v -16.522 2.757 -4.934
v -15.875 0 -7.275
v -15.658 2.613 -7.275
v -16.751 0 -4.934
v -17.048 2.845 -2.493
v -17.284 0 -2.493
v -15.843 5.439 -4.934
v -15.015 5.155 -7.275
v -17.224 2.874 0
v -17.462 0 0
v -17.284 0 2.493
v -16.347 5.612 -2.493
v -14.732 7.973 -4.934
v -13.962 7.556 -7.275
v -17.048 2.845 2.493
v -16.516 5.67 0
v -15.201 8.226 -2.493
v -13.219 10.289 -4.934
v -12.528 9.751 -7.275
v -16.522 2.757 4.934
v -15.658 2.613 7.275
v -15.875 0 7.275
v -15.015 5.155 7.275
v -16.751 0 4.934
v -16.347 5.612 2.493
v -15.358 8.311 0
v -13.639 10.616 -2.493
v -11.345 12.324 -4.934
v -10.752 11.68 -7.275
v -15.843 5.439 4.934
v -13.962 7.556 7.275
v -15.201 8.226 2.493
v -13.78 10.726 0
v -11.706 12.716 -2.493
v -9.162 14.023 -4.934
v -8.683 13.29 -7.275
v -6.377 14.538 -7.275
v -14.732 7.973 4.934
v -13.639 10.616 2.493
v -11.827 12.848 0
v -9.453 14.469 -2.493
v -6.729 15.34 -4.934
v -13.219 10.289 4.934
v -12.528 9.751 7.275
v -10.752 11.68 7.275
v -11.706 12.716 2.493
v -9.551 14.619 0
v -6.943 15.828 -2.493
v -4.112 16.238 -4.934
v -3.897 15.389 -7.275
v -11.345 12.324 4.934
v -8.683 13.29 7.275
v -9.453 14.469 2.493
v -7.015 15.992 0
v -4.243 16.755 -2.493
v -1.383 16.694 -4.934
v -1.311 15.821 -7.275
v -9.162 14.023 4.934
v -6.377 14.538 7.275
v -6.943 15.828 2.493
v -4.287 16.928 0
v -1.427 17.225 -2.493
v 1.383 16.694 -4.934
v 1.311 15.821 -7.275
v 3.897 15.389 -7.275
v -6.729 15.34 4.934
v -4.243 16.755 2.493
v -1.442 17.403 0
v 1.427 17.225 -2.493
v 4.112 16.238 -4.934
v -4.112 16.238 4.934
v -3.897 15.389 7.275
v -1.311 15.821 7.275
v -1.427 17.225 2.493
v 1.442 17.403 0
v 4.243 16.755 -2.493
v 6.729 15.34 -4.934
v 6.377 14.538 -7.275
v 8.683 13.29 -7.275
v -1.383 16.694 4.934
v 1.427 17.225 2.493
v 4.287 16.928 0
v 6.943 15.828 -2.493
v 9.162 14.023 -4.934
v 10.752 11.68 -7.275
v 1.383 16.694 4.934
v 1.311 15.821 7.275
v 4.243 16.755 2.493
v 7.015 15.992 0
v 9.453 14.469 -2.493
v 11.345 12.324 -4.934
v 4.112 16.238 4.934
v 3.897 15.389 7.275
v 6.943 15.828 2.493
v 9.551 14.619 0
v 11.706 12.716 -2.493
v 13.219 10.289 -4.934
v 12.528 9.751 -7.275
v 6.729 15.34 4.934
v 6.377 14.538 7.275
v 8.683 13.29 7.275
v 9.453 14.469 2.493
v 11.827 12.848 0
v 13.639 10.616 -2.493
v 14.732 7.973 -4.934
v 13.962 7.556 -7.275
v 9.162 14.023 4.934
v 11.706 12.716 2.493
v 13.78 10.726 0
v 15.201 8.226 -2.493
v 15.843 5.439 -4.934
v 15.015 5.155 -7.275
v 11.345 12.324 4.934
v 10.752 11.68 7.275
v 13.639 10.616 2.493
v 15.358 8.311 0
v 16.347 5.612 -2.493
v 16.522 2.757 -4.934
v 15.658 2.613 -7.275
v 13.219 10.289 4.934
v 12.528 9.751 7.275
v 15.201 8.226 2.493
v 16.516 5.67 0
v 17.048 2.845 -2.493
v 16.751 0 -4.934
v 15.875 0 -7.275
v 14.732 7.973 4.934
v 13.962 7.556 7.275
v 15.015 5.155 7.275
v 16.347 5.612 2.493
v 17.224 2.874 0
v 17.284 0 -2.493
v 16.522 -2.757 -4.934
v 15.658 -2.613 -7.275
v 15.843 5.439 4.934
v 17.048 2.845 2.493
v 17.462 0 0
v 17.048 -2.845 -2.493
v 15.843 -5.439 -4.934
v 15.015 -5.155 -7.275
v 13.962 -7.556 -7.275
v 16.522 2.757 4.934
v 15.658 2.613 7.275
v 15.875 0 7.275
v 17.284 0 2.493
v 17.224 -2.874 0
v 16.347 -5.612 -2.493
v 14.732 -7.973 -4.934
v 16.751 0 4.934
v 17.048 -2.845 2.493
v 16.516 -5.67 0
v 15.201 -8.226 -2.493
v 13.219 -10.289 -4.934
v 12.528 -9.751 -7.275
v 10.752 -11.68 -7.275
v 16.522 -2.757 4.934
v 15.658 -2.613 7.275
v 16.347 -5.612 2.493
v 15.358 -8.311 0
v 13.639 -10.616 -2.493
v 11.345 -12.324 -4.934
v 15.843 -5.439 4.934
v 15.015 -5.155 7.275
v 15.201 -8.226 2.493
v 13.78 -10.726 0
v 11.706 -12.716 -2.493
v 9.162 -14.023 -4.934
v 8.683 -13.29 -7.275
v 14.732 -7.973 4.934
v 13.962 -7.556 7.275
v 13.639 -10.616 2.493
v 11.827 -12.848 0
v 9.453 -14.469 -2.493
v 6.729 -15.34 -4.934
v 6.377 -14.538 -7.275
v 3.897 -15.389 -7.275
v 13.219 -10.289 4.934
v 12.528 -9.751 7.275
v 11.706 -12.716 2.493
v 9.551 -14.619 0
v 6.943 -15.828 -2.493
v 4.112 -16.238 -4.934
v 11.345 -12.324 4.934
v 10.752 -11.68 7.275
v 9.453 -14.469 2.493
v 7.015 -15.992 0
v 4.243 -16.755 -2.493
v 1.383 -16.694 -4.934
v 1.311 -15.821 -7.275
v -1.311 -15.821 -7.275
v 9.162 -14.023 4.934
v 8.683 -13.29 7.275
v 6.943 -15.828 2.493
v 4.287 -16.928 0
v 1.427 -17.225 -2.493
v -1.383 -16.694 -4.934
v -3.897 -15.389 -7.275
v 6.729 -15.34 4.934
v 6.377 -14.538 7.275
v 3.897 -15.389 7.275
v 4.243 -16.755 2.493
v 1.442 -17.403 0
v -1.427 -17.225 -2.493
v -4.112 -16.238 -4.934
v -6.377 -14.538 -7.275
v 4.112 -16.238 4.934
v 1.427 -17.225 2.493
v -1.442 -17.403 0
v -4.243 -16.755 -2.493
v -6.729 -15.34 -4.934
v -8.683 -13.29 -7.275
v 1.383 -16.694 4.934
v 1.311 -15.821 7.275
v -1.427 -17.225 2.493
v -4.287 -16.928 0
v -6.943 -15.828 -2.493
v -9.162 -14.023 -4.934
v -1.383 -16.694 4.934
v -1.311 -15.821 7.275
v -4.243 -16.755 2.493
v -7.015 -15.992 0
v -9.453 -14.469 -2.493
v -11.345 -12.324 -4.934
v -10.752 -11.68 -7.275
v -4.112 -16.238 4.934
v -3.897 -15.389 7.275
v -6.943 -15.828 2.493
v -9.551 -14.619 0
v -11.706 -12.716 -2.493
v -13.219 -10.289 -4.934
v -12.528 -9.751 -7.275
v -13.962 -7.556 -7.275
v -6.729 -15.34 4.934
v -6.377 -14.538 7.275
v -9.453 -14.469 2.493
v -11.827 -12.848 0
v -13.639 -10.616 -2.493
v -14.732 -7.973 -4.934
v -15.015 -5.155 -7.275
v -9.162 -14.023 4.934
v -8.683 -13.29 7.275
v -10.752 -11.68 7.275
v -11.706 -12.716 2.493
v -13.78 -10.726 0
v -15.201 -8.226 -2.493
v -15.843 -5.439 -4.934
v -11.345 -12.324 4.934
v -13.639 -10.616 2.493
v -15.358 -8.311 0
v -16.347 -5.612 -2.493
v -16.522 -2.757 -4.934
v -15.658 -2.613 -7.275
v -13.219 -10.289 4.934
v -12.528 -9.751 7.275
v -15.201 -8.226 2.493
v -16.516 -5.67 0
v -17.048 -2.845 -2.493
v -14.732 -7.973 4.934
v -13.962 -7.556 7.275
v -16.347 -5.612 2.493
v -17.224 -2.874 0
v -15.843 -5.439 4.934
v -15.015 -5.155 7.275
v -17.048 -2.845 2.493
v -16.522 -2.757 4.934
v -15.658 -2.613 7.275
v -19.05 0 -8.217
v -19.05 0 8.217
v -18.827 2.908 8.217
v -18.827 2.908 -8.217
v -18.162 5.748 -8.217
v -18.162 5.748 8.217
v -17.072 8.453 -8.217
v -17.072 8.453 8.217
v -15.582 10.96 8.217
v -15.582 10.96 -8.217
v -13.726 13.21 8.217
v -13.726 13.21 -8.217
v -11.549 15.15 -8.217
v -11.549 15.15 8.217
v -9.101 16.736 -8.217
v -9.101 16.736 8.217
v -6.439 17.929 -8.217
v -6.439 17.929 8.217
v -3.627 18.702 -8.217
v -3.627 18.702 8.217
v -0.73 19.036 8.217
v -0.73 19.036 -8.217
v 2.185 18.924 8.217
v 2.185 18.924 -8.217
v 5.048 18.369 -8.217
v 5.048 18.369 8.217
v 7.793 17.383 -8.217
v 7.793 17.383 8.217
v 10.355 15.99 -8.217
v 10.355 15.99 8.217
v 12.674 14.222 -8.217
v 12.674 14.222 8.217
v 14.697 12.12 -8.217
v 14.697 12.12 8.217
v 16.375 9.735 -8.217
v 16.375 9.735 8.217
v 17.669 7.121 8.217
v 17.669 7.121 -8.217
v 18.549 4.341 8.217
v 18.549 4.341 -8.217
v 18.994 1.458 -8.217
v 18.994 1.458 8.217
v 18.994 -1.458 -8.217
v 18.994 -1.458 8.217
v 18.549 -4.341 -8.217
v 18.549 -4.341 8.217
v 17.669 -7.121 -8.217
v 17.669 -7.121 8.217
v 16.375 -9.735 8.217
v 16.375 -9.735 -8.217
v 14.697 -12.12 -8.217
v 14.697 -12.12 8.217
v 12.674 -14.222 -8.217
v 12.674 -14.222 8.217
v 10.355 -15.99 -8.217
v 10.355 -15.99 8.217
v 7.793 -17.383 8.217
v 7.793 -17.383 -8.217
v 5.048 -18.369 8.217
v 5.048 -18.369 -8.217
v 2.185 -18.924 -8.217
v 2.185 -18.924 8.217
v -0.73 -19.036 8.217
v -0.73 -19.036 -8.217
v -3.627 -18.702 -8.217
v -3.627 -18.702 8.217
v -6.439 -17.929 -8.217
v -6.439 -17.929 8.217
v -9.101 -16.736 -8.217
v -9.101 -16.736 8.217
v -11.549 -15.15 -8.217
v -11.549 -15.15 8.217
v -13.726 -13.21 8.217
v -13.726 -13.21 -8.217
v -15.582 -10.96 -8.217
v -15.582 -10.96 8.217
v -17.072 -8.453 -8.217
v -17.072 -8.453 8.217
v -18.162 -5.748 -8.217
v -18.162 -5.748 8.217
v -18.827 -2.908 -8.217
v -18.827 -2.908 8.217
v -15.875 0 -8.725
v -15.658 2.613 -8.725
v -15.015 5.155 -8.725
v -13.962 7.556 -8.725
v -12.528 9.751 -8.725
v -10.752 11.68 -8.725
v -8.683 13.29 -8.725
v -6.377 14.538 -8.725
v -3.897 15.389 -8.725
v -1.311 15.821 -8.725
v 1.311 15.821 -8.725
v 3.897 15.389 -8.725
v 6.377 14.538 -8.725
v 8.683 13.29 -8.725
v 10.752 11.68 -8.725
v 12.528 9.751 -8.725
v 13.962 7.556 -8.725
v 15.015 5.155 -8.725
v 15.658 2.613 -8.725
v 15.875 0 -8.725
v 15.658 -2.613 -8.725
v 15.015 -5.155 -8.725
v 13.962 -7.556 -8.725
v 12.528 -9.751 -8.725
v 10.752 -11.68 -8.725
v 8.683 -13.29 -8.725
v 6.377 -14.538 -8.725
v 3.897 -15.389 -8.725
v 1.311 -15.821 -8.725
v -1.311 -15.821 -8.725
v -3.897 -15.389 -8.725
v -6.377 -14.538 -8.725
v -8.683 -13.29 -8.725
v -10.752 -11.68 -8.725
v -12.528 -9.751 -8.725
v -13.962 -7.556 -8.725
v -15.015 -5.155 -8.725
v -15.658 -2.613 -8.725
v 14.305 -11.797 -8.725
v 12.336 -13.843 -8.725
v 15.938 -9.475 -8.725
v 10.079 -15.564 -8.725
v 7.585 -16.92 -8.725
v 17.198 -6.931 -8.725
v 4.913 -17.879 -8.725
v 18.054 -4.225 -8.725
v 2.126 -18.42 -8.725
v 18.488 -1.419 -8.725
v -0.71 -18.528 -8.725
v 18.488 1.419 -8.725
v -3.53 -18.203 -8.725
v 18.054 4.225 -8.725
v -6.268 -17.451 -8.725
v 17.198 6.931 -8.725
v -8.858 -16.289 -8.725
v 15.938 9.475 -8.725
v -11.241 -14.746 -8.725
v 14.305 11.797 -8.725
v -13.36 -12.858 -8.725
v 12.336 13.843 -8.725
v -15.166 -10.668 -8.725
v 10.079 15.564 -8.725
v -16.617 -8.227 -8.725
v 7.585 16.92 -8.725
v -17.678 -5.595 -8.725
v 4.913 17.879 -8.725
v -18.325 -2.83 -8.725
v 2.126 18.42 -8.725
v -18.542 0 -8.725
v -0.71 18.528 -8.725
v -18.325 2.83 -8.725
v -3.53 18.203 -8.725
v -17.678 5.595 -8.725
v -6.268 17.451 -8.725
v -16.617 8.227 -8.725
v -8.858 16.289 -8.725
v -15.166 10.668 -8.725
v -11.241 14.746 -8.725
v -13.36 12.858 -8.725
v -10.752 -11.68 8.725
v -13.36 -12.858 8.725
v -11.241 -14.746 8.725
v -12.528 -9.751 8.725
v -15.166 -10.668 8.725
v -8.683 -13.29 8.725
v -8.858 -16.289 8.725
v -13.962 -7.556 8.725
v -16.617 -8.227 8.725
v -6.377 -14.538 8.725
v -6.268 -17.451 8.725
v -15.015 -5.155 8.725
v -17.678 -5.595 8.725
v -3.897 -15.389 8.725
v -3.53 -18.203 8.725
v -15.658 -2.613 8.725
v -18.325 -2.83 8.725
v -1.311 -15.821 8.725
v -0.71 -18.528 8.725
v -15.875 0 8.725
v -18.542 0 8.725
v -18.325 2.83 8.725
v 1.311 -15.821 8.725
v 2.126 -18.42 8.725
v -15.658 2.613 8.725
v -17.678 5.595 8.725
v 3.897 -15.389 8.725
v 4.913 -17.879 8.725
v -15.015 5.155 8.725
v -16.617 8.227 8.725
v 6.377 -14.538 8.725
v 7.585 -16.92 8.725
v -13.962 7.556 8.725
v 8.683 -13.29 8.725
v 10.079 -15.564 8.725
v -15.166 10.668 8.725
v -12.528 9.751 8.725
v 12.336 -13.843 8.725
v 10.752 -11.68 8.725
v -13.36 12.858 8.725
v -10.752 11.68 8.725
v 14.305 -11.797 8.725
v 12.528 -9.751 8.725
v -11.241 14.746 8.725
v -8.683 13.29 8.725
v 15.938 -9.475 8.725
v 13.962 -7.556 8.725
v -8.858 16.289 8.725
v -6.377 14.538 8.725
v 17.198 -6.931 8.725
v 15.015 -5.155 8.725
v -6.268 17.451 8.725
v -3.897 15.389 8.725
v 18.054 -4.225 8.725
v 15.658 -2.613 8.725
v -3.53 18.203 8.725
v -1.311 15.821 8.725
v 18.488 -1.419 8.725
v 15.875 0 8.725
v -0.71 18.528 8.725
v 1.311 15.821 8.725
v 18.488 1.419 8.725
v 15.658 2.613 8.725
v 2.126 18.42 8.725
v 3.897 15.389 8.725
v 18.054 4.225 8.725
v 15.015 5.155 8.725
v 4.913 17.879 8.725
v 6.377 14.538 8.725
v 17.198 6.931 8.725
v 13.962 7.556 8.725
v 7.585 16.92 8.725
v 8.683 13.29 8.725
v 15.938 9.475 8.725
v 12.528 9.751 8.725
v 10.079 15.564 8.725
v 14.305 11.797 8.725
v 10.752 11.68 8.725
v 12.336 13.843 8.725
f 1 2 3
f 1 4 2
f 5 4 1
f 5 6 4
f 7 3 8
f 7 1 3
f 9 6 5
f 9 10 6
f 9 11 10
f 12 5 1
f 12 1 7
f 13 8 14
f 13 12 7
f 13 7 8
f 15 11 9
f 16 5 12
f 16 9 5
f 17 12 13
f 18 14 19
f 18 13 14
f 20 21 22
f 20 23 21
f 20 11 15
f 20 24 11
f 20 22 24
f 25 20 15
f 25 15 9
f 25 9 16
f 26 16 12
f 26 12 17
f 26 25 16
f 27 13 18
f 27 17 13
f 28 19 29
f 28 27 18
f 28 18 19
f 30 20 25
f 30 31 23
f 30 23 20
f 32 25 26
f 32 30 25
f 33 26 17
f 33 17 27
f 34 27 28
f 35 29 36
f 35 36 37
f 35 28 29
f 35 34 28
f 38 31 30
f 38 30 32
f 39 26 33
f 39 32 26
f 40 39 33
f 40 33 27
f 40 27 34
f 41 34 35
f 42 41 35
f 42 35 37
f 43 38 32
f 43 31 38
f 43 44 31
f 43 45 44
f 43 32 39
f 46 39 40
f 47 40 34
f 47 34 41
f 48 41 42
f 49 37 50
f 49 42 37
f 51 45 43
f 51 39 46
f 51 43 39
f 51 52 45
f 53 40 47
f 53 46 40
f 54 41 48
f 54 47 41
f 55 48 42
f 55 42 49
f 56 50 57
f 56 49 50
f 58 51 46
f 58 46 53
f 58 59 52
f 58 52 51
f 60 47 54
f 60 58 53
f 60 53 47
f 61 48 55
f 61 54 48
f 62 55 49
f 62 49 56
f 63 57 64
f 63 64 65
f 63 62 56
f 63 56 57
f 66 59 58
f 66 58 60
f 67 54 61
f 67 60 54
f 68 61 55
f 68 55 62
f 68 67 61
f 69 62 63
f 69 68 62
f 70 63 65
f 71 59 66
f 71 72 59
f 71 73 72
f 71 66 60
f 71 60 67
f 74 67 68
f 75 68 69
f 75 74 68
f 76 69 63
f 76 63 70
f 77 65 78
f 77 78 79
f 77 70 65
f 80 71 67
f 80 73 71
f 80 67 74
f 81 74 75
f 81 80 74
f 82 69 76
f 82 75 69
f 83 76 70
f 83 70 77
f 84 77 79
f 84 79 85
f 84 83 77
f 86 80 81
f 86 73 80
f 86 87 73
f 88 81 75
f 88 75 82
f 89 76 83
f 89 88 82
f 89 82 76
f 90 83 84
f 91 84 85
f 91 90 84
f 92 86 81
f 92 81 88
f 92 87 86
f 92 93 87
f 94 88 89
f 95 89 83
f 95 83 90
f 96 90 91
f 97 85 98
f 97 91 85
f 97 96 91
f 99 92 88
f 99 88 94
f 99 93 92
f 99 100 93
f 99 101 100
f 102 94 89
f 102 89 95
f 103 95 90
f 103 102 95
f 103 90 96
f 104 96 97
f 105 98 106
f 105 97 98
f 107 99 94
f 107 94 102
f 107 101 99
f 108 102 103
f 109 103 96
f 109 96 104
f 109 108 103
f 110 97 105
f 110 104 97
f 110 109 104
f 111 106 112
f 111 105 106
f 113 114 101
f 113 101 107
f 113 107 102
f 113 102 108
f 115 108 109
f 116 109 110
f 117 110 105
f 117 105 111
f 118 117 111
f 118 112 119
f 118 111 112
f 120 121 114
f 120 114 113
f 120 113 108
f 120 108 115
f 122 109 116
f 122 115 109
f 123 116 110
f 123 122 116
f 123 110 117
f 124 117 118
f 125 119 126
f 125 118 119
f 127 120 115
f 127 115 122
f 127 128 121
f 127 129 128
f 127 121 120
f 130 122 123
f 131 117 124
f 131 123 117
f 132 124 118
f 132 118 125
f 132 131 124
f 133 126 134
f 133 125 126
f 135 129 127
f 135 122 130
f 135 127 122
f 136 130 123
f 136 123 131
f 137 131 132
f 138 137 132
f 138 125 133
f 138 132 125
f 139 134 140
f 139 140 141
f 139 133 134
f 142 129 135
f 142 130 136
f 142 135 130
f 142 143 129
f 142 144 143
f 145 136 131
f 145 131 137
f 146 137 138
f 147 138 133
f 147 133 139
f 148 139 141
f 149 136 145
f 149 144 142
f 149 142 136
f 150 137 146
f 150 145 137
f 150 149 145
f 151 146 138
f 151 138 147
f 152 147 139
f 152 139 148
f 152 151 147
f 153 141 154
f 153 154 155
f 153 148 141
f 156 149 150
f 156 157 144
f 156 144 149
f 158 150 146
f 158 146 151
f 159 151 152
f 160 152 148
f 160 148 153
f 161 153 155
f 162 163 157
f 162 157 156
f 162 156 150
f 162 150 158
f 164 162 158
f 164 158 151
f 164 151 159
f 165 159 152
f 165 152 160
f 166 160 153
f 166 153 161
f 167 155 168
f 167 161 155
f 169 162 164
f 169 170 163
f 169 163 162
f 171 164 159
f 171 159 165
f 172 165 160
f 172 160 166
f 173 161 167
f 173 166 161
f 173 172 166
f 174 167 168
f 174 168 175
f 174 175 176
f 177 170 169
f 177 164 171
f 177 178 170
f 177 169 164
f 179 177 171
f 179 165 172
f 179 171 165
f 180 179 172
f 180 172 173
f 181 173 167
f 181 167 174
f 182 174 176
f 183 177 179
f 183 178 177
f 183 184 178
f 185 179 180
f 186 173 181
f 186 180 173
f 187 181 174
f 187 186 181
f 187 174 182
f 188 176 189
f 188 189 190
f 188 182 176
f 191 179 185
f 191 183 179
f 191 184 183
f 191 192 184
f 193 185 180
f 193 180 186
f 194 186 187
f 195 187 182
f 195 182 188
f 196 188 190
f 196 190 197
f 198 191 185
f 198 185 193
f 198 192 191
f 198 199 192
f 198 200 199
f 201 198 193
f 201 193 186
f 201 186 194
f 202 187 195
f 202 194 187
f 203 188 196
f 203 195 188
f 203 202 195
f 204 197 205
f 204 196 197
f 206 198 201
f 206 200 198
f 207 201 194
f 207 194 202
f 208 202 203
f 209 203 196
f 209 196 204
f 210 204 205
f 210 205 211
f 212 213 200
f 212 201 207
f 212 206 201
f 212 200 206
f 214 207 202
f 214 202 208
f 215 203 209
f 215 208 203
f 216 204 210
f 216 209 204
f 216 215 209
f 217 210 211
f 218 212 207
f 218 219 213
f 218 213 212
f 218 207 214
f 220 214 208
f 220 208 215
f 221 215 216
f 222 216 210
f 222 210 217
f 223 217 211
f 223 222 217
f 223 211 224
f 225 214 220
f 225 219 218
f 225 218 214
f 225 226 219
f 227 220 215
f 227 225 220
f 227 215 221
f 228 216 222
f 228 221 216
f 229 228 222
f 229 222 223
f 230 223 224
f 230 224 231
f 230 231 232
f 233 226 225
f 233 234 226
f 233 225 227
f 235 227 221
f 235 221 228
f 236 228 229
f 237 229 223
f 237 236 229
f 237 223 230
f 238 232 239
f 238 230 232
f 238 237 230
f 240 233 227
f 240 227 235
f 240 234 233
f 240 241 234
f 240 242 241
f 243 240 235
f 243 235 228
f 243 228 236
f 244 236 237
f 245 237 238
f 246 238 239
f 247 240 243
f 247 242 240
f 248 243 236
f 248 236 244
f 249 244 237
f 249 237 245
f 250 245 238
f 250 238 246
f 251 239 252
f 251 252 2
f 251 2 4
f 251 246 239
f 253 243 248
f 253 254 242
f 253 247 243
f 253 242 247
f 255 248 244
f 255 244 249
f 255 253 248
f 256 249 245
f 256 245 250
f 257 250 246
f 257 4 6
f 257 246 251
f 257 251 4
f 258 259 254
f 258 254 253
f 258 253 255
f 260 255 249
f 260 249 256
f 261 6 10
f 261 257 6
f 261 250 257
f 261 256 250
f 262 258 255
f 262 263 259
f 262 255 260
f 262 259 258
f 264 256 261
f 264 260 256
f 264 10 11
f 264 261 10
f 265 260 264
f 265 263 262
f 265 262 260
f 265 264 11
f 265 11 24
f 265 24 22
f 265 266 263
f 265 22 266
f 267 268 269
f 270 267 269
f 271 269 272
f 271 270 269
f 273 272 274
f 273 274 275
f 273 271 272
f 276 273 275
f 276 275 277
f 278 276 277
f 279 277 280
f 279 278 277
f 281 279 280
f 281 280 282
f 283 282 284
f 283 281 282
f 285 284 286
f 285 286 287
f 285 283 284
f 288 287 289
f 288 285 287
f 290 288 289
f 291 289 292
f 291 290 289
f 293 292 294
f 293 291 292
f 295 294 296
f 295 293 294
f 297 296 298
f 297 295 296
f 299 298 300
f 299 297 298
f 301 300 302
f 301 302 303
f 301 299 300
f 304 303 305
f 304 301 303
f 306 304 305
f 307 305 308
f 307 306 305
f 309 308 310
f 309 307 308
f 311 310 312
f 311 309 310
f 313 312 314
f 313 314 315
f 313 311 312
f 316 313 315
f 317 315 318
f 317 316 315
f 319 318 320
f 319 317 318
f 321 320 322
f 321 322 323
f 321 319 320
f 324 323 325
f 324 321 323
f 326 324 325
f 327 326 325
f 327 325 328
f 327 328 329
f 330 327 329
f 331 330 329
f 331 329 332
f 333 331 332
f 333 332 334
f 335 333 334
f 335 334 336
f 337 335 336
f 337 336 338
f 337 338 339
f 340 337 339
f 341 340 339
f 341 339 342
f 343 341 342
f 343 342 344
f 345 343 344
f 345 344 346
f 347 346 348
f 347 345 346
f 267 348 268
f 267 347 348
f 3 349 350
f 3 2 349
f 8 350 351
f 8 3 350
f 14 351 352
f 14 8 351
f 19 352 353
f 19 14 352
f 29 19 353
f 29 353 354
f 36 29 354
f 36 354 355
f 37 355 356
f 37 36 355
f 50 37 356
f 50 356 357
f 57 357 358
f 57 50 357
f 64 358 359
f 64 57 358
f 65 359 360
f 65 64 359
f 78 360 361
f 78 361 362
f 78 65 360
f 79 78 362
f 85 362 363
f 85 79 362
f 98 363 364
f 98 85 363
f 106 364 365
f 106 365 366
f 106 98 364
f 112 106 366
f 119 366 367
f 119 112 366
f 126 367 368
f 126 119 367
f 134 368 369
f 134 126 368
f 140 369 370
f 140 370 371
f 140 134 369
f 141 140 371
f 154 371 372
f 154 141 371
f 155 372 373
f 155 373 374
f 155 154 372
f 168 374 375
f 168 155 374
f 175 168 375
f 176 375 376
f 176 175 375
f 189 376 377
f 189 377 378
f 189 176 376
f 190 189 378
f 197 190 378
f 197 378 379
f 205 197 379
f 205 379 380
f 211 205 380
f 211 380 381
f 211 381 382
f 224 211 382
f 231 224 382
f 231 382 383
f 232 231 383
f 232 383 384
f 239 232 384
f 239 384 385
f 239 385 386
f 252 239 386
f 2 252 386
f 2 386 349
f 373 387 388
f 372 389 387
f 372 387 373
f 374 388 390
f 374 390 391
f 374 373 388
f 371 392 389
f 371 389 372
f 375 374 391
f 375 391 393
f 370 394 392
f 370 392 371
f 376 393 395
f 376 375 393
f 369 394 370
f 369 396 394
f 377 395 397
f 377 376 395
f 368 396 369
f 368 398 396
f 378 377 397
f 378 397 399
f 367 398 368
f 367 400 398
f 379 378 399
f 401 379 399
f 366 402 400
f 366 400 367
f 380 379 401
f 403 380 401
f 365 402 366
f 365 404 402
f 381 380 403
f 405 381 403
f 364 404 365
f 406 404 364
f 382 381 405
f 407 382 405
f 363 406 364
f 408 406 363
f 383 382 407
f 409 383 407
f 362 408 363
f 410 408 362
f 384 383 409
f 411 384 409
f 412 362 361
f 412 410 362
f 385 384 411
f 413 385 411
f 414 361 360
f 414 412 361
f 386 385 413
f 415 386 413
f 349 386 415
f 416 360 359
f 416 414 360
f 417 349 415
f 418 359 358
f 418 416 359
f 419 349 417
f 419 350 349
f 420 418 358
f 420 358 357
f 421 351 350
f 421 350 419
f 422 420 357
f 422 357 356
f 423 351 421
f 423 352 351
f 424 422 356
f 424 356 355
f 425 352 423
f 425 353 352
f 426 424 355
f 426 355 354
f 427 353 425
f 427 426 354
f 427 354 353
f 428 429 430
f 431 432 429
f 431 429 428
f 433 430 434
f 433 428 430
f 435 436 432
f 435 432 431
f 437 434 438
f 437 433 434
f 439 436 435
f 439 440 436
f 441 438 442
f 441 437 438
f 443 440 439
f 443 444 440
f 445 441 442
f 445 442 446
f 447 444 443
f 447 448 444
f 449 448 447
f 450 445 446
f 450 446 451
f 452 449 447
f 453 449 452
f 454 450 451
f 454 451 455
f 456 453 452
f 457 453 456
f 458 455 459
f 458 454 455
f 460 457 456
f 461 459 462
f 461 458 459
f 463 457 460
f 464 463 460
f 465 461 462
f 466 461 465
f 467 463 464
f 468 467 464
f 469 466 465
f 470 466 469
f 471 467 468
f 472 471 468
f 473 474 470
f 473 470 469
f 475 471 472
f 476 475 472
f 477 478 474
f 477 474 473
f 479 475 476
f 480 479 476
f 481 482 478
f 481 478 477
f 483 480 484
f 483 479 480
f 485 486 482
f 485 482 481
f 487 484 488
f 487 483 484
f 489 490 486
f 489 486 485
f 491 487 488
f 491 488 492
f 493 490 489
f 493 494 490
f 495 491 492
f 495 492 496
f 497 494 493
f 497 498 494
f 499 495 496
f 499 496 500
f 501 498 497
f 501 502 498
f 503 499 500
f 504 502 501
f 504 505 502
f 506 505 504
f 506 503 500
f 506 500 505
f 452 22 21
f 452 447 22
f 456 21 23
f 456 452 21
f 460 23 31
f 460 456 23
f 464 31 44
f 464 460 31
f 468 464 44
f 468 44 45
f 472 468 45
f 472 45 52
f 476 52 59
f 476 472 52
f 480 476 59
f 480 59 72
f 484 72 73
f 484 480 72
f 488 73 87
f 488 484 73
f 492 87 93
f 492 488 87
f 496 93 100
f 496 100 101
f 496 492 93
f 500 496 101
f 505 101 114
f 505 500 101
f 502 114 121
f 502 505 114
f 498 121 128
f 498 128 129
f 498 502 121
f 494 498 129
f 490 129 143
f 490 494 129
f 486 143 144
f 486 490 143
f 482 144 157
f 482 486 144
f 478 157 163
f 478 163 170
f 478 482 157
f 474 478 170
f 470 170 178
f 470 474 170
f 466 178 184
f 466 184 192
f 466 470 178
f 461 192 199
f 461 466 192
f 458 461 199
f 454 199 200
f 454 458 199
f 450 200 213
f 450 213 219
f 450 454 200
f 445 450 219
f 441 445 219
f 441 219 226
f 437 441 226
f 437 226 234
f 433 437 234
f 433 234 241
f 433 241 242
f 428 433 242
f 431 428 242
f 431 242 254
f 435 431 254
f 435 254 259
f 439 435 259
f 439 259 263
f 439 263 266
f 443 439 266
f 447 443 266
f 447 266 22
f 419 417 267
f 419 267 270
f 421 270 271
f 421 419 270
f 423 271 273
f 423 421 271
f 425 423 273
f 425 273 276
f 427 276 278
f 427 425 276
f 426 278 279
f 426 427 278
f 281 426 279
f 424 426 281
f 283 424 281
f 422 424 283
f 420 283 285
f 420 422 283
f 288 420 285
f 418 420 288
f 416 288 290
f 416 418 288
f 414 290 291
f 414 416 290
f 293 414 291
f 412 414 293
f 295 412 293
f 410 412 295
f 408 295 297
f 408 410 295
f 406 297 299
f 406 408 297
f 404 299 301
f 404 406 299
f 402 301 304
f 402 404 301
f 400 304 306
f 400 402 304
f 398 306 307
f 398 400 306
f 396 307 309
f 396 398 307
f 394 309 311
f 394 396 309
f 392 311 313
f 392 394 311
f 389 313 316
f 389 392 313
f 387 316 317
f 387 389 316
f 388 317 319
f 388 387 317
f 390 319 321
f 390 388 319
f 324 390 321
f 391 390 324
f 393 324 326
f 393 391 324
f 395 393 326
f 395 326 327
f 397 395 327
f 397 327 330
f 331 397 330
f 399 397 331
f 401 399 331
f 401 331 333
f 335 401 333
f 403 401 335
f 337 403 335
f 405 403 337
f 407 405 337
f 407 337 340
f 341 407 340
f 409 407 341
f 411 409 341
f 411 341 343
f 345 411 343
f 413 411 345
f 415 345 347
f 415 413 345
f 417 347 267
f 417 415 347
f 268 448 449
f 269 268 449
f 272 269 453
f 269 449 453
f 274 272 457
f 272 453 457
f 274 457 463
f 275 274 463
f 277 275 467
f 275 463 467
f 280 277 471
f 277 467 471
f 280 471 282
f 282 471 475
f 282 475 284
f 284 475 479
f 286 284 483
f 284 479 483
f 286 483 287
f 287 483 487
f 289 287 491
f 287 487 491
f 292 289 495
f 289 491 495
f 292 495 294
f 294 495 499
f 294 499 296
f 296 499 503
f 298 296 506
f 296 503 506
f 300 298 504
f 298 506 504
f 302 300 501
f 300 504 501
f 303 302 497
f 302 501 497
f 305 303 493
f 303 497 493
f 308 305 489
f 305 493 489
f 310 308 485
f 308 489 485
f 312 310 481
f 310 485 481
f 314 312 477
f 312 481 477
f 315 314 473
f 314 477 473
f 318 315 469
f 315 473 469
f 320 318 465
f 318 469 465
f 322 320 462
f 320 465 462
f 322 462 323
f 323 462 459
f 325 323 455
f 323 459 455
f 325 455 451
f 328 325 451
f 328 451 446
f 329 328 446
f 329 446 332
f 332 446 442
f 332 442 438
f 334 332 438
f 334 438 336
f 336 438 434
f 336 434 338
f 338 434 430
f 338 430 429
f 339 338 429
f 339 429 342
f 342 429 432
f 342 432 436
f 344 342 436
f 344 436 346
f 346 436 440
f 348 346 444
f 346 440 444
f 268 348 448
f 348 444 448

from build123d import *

# Parameters (mm, degrees)
F2_SIZE = 0.508


with BuildPart() as f1:
    # F0 (on Front) → F1 (revolve)
    with BuildSketch(Plane.XZ):
        with BuildLine():
            Line((-19.05, 8.7249), (-19.05, -8.7249))
            Line((-19.05, -8.7249), (-15.875, -8.7249))
            Line((-15.875, -8.7249), (-15.875, -7.274839))
            ThreePointArc((-15.875, -7.274839), (-17.4625, 0), (-15.875, 7.274839))
            Line((-15.875, 7.274839), (-15.875, 8.7249))
            Line((-15.875, 8.7249), (-19.05, 8.7249))
        make_face()
    revolve(axis=Axis((0, 0, -0.747743), (0, 0, -1)))

    # F2
    f2_edges = [f1.edges().sort_by_distance(p)[0] for p in [
        (19.05, 0, 8.7249),
        (19.05, 0, -8.7249),
    ]]
    chamfer(f2_edges, length=F2_SIZE)


solid = f1.part
